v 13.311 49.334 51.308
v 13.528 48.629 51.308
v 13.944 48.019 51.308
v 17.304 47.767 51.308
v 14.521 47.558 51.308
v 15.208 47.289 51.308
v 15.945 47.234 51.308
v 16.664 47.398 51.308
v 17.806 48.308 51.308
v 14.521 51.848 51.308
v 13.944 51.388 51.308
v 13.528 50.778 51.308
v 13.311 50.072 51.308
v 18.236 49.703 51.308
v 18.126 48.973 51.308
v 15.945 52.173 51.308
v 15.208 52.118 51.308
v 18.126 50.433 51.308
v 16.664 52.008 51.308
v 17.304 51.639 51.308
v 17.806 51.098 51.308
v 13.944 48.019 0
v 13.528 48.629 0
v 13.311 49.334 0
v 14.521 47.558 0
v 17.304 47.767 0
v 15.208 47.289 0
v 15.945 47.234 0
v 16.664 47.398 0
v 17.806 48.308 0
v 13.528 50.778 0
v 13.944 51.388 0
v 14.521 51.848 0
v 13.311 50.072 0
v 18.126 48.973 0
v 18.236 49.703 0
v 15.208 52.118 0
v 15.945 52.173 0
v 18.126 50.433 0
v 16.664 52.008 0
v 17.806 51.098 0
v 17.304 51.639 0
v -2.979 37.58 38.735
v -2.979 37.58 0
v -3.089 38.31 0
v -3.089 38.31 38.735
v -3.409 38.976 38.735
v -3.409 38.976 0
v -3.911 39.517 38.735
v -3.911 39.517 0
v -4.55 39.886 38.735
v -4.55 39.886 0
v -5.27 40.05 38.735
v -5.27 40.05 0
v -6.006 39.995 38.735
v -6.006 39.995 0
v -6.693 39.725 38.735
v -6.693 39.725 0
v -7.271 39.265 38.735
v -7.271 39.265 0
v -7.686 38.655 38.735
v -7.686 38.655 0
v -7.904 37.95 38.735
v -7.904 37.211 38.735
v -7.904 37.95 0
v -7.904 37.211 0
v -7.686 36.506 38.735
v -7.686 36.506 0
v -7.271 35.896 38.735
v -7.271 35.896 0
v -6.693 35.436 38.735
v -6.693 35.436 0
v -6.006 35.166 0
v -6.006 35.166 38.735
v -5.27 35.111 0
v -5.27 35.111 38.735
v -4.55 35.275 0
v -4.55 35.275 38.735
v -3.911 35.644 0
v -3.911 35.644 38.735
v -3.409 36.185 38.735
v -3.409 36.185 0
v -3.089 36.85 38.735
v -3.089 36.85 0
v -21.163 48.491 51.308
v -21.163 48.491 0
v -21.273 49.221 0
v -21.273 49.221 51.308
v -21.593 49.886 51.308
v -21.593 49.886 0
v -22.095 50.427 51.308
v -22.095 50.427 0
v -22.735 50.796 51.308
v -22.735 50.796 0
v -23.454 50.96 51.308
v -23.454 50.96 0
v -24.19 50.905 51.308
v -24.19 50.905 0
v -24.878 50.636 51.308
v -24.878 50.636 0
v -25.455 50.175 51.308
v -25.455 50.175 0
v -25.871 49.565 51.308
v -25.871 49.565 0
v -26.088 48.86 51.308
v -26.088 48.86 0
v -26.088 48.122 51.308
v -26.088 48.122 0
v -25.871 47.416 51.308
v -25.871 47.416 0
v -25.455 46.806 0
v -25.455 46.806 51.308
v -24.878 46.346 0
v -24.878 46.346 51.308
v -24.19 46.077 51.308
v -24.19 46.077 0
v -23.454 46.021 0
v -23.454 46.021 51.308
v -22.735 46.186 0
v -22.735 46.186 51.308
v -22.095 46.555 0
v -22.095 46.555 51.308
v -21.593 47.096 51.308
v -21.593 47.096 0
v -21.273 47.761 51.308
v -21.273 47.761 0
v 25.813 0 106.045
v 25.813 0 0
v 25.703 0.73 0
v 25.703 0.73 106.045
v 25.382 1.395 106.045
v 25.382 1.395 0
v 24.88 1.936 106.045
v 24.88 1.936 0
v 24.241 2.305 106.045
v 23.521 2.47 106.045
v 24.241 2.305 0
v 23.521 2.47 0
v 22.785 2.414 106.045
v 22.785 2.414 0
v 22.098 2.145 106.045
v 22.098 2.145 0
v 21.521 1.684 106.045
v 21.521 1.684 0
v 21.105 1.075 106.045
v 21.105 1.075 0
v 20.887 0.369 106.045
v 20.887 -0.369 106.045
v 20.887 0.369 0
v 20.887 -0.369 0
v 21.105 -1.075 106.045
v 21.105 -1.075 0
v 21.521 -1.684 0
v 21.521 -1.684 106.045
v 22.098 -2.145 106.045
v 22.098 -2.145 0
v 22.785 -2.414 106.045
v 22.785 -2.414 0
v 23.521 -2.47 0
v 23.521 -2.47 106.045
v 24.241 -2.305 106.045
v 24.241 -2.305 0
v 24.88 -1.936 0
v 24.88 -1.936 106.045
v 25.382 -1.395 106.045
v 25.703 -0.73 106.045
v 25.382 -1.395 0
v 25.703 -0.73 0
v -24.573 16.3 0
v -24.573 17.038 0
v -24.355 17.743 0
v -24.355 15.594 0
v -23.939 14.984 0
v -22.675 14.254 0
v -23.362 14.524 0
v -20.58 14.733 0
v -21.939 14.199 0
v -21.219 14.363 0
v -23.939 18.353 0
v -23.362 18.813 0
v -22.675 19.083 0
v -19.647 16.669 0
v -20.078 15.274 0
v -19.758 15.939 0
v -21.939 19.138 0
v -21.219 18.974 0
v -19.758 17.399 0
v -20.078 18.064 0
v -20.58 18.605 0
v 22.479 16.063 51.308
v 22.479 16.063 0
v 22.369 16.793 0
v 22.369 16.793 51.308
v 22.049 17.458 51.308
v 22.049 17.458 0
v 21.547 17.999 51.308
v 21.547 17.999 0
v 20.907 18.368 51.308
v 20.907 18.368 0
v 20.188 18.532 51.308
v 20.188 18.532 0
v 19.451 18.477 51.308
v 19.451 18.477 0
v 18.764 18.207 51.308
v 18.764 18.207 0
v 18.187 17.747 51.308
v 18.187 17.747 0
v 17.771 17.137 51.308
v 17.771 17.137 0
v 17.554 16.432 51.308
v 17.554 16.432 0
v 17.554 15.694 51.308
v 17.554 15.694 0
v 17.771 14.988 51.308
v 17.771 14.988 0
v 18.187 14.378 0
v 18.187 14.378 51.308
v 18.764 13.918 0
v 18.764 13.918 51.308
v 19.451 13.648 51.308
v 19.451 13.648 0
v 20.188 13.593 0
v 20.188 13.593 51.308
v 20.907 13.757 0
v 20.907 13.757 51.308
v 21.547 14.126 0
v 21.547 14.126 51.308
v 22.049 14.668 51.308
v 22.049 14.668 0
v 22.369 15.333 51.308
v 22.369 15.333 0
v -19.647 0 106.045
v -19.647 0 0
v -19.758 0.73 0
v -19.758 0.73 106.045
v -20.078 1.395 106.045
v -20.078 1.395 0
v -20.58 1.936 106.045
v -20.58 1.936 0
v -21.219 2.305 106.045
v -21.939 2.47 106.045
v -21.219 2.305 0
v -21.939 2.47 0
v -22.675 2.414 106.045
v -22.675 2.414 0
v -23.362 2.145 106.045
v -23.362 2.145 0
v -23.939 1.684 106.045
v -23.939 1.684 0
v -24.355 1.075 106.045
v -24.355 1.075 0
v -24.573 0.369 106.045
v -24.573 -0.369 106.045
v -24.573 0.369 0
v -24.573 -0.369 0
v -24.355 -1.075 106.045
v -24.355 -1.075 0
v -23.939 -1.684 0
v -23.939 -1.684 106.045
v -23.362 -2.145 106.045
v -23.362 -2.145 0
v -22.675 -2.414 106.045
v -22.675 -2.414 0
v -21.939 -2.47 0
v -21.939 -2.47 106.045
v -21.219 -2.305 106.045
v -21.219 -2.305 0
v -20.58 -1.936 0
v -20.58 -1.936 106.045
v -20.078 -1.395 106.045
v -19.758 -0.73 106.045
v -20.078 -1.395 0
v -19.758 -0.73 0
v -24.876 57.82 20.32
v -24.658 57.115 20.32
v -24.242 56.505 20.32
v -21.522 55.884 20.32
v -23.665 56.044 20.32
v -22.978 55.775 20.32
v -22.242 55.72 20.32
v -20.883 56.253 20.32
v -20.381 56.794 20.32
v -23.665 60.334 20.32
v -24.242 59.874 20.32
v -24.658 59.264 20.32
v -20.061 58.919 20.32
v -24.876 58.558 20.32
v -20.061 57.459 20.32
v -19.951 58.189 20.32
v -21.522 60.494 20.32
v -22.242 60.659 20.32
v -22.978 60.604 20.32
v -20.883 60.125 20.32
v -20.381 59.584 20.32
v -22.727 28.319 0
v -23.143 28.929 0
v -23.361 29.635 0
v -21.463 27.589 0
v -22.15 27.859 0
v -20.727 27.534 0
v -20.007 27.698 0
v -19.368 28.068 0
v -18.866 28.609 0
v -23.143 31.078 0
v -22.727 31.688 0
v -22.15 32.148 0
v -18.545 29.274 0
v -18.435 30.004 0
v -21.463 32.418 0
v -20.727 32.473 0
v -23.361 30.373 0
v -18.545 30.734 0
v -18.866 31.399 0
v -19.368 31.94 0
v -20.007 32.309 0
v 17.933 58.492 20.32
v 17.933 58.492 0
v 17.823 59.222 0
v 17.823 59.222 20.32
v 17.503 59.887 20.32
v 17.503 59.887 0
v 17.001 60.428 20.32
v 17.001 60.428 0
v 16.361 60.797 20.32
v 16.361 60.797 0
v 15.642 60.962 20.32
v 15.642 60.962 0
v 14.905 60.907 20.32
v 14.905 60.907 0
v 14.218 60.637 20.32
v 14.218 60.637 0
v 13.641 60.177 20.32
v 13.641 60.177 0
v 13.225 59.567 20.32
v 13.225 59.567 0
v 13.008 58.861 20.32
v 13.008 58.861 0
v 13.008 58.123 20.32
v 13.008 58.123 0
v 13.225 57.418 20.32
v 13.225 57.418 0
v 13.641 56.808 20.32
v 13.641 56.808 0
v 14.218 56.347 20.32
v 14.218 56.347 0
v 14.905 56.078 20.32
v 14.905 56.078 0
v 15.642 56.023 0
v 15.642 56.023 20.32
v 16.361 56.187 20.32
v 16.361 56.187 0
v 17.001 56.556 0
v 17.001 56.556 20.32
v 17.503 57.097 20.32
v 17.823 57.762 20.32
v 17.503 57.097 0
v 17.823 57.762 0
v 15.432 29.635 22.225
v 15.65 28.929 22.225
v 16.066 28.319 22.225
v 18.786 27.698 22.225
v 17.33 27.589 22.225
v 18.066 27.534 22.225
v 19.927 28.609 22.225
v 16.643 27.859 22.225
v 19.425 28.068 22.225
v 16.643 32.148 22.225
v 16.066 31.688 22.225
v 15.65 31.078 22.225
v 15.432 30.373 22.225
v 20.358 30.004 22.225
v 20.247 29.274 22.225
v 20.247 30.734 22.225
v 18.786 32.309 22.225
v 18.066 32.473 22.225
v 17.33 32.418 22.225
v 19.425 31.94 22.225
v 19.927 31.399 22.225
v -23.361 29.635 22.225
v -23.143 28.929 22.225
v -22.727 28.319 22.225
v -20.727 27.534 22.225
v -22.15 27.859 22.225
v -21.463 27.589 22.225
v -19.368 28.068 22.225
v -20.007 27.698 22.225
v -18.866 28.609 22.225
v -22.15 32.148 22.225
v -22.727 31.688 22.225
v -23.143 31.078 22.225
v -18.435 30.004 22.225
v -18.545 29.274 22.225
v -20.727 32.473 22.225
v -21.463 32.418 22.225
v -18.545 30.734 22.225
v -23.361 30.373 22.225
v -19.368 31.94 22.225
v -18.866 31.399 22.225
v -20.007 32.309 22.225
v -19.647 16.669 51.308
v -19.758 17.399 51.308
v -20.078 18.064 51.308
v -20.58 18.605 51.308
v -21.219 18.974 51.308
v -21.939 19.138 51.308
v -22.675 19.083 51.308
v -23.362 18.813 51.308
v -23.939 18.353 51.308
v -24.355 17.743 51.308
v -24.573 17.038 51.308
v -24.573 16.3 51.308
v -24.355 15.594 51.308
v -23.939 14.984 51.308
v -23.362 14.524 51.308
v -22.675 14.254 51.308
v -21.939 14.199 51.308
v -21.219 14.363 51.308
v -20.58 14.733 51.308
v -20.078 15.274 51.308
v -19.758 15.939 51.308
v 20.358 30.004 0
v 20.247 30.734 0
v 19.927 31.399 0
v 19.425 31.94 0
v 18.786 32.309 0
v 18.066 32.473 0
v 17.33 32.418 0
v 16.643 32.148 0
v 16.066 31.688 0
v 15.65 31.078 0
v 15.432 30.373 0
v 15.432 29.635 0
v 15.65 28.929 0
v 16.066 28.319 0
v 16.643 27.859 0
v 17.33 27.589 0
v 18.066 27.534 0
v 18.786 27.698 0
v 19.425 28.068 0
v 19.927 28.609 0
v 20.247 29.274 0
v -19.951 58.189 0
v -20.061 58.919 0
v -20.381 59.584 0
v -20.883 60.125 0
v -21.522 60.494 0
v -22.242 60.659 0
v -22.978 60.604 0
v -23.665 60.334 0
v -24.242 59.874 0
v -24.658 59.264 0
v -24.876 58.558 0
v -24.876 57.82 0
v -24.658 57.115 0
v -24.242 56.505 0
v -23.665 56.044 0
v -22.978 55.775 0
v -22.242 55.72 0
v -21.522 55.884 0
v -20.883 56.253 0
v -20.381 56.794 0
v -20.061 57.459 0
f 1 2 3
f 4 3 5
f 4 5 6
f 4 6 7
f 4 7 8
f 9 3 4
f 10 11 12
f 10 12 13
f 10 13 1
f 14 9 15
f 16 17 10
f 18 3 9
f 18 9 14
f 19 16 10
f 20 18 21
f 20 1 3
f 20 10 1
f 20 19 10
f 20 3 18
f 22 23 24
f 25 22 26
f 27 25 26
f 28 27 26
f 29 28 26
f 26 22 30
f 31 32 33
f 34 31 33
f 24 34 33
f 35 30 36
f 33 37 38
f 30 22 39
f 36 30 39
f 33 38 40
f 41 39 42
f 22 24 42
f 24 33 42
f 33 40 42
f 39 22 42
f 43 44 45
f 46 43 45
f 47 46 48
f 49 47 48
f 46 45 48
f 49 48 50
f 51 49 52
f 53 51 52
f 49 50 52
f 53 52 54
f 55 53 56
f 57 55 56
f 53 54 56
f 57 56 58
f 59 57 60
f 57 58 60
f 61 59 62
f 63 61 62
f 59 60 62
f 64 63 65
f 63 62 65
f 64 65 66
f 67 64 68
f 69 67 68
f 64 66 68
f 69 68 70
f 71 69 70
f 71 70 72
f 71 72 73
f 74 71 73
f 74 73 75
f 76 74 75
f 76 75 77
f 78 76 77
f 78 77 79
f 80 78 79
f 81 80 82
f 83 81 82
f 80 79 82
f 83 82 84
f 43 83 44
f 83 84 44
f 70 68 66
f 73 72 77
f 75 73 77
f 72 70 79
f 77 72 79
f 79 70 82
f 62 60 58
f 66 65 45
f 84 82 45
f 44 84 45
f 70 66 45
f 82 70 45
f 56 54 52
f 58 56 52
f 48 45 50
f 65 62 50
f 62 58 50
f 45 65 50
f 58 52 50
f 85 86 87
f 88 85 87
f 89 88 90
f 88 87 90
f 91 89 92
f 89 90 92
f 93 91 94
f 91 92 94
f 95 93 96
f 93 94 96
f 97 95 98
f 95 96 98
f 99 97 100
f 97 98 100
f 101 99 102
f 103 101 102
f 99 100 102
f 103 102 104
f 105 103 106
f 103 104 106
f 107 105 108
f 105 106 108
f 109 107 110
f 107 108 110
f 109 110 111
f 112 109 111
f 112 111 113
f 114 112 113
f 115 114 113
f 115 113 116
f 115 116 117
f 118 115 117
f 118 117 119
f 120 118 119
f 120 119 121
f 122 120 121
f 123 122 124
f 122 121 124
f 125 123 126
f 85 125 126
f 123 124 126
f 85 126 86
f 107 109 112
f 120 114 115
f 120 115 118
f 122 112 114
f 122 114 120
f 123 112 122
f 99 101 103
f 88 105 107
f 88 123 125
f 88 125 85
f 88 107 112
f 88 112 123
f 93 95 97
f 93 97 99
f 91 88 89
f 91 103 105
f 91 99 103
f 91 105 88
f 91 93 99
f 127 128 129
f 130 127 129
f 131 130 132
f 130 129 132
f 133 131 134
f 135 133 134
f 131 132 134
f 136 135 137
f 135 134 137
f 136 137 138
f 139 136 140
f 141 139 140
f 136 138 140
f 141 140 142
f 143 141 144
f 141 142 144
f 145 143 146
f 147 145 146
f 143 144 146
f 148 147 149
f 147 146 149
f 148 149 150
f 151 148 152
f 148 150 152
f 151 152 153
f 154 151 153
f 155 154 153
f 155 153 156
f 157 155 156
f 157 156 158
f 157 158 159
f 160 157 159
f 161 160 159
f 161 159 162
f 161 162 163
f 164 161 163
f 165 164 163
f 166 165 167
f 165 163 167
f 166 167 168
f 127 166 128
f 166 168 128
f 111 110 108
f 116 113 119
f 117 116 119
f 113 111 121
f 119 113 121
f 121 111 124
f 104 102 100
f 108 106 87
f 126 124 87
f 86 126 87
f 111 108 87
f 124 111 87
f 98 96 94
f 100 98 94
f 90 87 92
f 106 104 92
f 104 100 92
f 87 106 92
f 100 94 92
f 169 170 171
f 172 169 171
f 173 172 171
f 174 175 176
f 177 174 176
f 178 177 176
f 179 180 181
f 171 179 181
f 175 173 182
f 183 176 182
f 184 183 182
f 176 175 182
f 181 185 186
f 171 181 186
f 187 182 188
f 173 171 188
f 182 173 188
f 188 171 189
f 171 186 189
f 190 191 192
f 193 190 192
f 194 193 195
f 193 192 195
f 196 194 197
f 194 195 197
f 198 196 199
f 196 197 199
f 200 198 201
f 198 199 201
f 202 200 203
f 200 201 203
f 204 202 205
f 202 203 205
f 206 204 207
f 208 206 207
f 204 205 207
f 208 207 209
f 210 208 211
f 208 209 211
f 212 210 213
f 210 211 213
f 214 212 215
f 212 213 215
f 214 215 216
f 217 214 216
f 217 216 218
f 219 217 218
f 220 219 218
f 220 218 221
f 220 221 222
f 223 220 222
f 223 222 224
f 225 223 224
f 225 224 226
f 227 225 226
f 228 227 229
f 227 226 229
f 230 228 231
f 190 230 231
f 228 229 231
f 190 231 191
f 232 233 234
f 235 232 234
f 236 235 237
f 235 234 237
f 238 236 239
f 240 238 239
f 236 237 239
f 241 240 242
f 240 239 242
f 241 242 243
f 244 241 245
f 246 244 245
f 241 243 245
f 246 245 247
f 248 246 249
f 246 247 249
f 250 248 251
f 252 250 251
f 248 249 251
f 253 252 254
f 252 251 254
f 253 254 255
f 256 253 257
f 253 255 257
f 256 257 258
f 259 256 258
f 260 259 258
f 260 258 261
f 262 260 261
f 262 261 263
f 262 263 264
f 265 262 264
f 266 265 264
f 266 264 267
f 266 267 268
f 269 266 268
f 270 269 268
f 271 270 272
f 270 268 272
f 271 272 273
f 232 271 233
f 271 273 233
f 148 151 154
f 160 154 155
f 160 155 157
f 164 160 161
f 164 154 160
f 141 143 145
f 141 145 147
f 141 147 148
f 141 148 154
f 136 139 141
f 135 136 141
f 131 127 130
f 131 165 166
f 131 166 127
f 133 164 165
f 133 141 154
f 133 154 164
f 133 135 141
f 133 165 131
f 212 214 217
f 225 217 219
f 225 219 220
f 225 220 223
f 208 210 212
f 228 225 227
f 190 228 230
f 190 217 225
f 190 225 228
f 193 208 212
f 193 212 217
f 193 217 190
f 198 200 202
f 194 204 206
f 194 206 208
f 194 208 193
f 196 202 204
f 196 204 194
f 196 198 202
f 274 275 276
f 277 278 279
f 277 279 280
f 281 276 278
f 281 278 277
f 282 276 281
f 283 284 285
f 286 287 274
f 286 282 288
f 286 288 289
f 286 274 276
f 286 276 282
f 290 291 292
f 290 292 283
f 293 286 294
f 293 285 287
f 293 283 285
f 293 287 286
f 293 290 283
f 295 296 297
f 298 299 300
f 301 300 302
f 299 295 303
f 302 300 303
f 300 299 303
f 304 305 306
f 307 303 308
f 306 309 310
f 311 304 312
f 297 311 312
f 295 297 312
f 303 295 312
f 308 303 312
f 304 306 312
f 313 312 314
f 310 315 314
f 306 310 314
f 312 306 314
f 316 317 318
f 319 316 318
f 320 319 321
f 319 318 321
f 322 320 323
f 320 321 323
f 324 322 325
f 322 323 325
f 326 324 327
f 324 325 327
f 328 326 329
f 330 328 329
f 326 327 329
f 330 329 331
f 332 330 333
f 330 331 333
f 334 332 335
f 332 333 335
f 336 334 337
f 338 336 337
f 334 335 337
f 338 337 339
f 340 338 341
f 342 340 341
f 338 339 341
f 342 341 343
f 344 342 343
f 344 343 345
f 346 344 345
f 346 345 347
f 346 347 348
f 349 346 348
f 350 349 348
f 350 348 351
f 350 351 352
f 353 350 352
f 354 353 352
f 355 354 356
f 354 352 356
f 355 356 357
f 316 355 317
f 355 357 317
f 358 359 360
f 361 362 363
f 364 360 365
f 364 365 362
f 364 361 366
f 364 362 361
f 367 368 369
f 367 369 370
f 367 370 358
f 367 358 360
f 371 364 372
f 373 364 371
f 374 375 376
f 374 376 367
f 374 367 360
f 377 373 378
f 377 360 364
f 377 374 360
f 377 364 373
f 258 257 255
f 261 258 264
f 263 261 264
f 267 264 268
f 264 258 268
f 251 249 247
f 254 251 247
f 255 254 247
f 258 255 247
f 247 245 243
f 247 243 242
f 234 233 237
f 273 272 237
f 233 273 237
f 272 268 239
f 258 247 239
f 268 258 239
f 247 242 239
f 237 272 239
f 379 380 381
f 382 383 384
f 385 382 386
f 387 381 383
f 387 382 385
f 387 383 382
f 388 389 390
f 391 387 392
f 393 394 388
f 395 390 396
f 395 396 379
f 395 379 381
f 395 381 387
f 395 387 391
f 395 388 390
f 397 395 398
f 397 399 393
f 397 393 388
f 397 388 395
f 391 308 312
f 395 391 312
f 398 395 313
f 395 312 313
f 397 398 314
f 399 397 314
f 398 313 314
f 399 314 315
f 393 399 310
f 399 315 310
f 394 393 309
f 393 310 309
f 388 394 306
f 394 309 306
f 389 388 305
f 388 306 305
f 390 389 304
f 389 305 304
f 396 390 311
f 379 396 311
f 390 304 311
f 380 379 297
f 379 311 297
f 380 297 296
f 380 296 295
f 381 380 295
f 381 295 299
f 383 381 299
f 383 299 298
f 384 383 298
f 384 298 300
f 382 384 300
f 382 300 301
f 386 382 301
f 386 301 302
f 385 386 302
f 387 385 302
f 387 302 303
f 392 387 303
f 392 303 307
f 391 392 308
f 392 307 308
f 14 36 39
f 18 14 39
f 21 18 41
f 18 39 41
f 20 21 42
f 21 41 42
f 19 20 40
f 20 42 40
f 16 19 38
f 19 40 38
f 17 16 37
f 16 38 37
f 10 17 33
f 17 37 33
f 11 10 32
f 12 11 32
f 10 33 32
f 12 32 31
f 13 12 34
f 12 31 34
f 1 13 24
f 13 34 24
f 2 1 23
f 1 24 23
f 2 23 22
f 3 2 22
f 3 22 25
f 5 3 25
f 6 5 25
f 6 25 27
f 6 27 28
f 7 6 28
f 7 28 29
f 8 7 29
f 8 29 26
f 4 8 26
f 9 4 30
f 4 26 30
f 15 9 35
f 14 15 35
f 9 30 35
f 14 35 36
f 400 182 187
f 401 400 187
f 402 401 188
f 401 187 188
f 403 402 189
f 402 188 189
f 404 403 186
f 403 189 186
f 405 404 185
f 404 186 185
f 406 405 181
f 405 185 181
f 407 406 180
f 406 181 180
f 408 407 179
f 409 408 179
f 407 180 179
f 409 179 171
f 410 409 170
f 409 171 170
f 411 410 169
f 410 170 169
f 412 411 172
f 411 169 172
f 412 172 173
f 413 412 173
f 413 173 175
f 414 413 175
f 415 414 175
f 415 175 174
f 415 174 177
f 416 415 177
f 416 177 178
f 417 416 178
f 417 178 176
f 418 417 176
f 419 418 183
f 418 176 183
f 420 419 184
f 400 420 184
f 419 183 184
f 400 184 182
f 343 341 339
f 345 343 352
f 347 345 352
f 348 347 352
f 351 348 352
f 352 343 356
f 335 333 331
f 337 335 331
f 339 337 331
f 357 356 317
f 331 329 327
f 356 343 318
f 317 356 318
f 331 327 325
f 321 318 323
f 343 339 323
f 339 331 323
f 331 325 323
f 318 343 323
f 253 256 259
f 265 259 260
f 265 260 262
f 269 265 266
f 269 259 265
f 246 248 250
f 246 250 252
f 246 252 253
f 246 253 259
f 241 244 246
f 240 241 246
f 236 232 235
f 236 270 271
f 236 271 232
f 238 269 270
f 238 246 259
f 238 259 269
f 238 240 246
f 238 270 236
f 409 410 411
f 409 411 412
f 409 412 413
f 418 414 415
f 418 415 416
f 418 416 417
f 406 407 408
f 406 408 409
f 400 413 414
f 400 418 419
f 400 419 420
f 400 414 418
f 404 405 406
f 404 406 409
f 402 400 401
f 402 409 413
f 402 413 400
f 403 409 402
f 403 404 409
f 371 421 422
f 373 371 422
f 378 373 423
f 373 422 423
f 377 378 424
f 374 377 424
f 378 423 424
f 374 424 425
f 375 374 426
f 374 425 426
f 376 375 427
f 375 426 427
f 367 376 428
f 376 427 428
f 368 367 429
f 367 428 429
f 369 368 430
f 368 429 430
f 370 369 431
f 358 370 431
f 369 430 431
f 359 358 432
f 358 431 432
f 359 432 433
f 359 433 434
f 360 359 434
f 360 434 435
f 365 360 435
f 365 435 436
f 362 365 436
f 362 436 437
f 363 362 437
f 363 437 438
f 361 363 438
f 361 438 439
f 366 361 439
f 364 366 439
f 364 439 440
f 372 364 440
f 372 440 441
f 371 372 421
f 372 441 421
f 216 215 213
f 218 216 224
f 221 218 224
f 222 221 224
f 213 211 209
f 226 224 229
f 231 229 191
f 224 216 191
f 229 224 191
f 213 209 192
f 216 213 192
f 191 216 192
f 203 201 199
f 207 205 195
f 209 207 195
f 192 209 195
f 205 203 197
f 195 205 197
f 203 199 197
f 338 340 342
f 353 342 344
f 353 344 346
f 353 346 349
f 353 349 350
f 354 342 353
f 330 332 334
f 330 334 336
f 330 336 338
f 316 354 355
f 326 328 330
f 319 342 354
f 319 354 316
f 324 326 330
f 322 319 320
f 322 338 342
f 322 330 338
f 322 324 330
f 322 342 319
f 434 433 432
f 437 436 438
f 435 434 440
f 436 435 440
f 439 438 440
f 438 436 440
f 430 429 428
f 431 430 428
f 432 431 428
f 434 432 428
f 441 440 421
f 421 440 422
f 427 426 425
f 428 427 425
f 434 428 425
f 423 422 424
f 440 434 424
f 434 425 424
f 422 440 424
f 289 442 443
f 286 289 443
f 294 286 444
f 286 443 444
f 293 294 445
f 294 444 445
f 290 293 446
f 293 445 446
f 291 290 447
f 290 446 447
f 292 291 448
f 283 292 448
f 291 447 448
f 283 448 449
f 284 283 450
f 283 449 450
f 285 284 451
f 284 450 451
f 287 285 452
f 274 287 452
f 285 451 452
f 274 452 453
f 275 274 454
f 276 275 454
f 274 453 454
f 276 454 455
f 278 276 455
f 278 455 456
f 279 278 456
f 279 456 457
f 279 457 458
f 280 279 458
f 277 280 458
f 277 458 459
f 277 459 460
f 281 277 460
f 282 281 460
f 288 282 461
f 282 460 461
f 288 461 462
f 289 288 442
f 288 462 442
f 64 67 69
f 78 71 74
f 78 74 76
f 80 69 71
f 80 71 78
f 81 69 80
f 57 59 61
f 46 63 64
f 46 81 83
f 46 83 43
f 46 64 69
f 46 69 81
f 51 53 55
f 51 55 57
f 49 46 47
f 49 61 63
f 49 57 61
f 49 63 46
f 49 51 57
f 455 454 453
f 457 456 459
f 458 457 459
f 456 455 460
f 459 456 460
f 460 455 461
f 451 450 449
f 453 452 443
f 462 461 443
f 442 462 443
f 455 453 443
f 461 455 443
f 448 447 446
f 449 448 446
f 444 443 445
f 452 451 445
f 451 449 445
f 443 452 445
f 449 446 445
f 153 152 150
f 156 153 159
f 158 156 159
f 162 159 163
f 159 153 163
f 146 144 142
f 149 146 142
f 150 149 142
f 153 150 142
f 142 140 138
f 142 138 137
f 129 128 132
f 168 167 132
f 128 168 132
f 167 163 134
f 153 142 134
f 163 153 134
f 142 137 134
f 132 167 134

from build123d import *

# Parameters (mm, degrees)
F0_R      = 2.4765
F1_DEPTH  = 106.045
F2_R      = 2.4765
F3_DEPTH  = 51.308
F4_R      = 2.4765
F5_DEPTH  = 22.225
F6_R      = 2.4765
F7_DEPTH  = 38.735
F8_R      = 2.4765
F9_DEPTH  = 51.308
F10_R     = 2.4765
F11_DEPTH = 20.32


with BuildPart() as f1:
    # F0 (on Top) → F1 (new body)
    with BuildSketch(Plane.XY):
        with Locations((-22.123978, 0)):
            Circle(F0_R)
        with Locations((23.33625, 0)):
            Circle(F0_R)
    extrude(amount=F1_DEPTH)


with BuildPart() as f3:
    # F2 (on Top) → F3 (new body)
    with BuildSketch(Plane.XY):
        with Locations((-22.123978, 16.66875)):
            Circle(F2_R)
        with Locations((20.002501, 16.062614)):
            Circle(F2_R)
    extrude(amount=F3_DEPTH)


with BuildPart() as f5:
    # F4 (on Top) → F5 (new body)
    with BuildSketch(Plane.XY):
        with Locations((-20.911705, 30.003751)):
            Circle(F4_R)
        with Locations((17.881023, 30.003751)):
            Circle(F4_R)
    extrude(amount=F5_DEPTH)


with BuildPart() as f7:
    # F6 (on Top) → F7 (new body)
    with BuildSketch(Plane.XY):
        with Locations((-5.455227, 37.580457)):
            Circle(F6_R)
    extrude(amount=F7_DEPTH)


with BuildPart() as f9:
    # F8 (on Top) → F9 (new body)
    with BuildSketch(Plane.XY):
        with Locations((-23.639319, 48.490912)):
            Circle(F8_R)
        with Locations((15.759546, 49.703185)):
            Circle(F8_R)
    extrude(amount=F9_DEPTH)


with BuildPart() as f11:
    # F10 (on Top) → F11 (new body)
    with BuildSketch(Plane.XY):
        with Locations((-22.427047, 58.189094)):
            Circle(F10_R)
        with Locations((15.456477, 58.492161)):
            Circle(F10_R)
    extrude(amount=F11_DEPTH)


solid = Compound([f1.part, f3.part, f5.part, f7.part, f9.part, f11.part])
